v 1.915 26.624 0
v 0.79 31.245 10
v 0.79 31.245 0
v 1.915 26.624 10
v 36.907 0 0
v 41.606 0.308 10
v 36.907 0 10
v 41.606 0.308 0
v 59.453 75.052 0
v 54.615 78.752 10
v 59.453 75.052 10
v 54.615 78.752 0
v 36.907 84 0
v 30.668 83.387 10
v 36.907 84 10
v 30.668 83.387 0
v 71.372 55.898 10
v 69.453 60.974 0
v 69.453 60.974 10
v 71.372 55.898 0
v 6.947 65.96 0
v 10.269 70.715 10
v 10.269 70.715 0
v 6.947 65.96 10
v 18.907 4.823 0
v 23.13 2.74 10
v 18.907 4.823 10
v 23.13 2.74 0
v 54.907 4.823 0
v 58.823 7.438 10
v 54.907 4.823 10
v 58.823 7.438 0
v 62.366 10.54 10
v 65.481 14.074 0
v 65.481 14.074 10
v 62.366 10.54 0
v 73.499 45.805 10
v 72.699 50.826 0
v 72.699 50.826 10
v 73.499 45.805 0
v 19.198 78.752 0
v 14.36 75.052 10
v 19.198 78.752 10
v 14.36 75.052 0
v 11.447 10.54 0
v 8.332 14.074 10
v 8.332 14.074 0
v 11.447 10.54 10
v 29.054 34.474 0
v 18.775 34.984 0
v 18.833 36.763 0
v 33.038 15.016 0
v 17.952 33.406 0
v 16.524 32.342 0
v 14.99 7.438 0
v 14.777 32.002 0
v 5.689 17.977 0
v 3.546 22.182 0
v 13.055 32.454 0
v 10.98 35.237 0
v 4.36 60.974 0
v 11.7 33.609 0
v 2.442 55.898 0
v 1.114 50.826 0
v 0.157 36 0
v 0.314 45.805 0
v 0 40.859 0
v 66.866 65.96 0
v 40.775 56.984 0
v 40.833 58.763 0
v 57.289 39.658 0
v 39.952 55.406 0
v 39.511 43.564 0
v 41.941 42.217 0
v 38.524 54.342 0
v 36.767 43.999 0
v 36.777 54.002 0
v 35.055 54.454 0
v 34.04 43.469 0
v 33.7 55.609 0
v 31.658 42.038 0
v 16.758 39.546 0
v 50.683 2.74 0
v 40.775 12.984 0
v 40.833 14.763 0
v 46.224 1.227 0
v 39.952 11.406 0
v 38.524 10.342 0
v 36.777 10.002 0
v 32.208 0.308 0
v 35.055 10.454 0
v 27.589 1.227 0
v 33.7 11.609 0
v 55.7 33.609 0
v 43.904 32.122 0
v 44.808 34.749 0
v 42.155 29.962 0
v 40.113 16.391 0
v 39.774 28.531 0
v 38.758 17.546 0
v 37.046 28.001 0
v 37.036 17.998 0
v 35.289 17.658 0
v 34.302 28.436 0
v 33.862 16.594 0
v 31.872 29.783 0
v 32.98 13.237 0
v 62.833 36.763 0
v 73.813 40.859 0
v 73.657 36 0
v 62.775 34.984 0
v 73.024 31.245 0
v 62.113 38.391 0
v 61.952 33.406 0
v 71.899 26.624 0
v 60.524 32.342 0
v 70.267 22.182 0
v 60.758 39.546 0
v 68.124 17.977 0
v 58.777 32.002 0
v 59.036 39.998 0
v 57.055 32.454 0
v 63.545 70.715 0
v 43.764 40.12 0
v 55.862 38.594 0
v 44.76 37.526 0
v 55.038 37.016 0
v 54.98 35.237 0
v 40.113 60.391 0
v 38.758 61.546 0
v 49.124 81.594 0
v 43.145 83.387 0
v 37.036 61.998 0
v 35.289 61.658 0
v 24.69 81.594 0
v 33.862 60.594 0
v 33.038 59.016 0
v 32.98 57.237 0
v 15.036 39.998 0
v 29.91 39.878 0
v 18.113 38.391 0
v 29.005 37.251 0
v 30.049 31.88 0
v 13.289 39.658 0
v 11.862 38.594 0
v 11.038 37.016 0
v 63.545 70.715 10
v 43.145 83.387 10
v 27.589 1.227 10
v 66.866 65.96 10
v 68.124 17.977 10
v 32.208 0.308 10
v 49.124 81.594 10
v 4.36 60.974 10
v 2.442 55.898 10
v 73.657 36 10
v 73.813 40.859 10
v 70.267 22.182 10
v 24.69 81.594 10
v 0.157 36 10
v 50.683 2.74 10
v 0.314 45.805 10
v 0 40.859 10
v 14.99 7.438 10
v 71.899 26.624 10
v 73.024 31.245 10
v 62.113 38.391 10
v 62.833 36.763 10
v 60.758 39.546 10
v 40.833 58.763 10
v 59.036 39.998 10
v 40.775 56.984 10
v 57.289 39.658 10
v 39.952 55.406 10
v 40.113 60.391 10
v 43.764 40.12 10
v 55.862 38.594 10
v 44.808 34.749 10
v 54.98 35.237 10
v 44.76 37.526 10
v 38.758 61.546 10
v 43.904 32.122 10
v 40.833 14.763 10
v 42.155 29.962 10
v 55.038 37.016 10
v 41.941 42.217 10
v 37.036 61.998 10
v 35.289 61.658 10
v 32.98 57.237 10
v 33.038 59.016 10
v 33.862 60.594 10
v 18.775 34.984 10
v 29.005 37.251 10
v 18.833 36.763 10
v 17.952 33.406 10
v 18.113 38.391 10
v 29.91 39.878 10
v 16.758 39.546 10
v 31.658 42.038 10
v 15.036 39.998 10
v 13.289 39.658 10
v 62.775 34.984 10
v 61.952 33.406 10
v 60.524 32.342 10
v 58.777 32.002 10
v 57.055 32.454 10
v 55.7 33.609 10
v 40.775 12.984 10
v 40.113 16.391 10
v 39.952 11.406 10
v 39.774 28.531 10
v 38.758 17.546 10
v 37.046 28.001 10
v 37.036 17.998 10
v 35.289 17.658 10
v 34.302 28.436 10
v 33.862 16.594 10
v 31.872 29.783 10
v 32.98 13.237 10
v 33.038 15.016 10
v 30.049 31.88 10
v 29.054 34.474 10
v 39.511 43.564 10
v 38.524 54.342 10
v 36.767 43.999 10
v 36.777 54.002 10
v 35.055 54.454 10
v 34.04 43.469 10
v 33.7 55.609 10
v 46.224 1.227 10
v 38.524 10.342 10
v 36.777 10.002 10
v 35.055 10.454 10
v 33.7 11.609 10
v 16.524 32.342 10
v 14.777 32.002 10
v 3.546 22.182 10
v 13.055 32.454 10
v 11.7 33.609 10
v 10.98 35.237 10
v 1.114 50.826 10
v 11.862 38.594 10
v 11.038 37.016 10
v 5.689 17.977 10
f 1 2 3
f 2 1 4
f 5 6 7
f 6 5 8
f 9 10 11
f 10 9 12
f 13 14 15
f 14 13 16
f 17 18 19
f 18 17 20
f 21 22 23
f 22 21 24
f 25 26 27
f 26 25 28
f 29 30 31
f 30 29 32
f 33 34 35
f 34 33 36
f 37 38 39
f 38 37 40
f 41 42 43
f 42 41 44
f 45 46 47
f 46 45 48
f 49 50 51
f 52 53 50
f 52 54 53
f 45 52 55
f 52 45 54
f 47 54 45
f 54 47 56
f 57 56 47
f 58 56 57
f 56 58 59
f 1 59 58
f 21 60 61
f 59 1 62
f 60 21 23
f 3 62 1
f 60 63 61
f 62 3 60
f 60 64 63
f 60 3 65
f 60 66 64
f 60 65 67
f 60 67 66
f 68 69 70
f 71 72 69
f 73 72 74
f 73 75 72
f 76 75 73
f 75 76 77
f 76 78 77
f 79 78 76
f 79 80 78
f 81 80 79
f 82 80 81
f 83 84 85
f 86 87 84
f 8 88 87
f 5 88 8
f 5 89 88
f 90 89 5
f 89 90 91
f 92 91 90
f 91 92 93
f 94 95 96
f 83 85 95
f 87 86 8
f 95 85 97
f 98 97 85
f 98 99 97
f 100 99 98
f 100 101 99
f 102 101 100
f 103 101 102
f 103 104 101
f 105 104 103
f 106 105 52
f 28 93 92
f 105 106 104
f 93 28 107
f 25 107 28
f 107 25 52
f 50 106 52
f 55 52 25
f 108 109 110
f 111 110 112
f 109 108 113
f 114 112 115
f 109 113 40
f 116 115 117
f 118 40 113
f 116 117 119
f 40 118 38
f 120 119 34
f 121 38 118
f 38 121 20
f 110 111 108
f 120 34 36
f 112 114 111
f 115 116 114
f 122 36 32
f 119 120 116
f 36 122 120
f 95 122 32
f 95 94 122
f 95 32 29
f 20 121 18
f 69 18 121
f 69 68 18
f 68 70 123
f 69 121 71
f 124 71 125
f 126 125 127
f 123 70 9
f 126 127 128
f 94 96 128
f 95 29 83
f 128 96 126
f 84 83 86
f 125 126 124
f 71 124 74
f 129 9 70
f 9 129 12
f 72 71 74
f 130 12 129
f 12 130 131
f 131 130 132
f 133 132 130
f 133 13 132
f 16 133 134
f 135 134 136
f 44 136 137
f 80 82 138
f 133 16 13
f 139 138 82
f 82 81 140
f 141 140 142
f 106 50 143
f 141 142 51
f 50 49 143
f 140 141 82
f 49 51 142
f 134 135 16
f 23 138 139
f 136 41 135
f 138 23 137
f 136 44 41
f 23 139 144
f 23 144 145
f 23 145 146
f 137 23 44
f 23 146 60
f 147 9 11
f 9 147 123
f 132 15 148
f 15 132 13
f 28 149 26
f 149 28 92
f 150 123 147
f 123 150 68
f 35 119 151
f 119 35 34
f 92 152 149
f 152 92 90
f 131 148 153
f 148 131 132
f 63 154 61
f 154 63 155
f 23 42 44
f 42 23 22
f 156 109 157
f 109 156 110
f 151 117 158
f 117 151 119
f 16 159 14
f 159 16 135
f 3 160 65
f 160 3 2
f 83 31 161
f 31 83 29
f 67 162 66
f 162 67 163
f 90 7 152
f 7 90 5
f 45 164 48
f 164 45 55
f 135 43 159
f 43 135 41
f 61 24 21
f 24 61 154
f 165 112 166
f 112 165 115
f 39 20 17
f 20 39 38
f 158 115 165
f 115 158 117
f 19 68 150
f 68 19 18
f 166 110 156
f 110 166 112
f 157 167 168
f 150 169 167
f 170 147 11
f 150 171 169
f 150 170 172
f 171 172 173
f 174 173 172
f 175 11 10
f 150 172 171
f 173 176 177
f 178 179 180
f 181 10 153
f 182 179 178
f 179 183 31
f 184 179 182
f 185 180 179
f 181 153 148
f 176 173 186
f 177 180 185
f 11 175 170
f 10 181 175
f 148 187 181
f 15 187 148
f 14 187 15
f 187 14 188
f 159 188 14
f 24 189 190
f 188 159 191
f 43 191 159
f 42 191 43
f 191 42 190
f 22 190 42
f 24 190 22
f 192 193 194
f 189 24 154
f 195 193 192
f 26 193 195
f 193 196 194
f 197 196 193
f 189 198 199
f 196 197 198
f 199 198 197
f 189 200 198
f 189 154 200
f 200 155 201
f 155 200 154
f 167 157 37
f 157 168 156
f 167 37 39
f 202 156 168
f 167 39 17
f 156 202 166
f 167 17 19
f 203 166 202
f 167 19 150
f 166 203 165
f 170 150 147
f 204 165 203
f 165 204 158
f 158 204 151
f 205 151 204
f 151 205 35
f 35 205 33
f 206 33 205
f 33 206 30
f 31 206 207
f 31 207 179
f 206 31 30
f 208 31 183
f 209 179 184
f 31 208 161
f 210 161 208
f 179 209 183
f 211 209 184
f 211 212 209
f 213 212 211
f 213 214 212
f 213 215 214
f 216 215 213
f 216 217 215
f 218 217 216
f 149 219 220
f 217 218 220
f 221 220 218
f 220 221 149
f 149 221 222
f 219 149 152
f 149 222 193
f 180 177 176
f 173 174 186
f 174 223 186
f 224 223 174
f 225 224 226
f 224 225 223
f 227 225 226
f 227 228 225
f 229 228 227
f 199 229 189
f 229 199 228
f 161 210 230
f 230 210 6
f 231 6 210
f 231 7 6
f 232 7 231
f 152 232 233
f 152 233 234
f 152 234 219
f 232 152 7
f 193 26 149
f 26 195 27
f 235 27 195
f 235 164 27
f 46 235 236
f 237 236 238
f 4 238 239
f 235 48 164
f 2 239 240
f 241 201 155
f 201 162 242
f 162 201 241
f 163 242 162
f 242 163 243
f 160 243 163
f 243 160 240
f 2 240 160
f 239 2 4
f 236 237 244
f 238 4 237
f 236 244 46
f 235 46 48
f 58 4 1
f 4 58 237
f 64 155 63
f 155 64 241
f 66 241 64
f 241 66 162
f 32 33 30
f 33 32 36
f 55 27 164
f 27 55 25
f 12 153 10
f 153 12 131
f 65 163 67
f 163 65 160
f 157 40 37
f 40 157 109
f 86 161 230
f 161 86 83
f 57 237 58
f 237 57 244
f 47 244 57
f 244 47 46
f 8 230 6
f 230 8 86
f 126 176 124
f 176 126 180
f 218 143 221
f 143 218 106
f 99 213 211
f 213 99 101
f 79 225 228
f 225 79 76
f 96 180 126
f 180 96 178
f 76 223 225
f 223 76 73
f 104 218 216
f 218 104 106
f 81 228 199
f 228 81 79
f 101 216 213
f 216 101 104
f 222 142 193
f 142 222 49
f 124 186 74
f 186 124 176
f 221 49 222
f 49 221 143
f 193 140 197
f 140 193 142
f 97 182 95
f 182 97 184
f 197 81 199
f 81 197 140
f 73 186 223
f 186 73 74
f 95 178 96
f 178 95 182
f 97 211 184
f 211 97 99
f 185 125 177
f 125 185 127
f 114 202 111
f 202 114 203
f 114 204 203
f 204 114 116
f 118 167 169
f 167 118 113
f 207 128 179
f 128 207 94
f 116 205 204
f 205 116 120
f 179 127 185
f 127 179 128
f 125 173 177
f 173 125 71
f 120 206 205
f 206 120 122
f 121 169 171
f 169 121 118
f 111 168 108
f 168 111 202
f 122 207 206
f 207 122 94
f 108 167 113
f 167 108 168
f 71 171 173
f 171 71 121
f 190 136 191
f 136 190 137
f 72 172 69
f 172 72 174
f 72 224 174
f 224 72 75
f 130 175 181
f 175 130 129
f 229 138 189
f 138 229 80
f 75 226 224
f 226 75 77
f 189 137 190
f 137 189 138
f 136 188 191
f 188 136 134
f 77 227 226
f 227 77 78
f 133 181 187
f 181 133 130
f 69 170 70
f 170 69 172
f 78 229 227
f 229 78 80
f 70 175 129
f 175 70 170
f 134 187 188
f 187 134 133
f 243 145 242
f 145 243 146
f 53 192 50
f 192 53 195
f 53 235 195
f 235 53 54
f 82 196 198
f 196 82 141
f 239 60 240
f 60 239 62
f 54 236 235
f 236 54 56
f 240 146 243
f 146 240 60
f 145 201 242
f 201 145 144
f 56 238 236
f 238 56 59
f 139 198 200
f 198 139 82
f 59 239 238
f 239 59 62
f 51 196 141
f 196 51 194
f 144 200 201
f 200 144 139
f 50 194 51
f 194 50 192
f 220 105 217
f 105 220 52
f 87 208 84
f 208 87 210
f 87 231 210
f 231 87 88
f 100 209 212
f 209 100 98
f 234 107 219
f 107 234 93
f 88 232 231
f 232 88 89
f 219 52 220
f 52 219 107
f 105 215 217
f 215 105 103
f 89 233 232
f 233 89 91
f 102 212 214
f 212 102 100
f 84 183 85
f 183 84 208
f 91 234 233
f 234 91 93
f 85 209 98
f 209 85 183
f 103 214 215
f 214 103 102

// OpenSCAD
$fn = 32;

// ----------------------------------------------------------------------
// Cam plate: single_lobe cam, base R36
// ----------------------------------------------------------------------

// --- parameters (mm) ---
base_r = 36;              // base circle radius
lobe_h = 12;              // cam lobe rise
bore_r = 8;               // shaft bore radius
plate_t = 10;             // plate thickness, Z (extrusion height)
ring_r = 22;              // lightening ring radius
bolt_r = 4;               // lightening hole radius
fit_tol = 0.05;           // declared fit tolerance (prompt contract)
free_tol = 0.2;           // declared free tolerance (prompt contract)

profile = [[73.657, 36], [73.813, 40.859], [73.499, 45.805], [72.699, 50.826], [71.372, 55.898], [69.453, 60.974], [66.866, 65.96], [63.545, 70.715], [59.453, 75.052], [54.615, 78.752], [49.124, 81.594], [43.145, 83.387], [36.907, 84], [30.668, 83.387], [24.69, 81.594], [19.198, 78.752], [14.36, 75.052], [10.269, 70.715], [6.947, 65.96], [4.36, 60.974], [2.442, 55.898], [1.114, 50.826], [0.314, 45.805], [0, 40.859], [0.157, 36], [0.79, 31.245], [1.915, 26.624], [3.546, 22.182], [5.689, 17.977], [8.332, 14.074], [11.447, 10.54], [14.99, 7.438], [18.907, 4.823], [23.13, 2.74], [27.589, 1.227], [32.208, 0.308], [36.907, 0], [41.606, 0.308], [46.224, 1.227], [50.683, 2.74], [54.907, 4.823], [58.823, 7.438], [62.366, 10.54], [65.481, 14.074], [68.124, 17.977], [70.267, 22.182], [71.899, 26.624], [73.024, 31.245]];  // primary outline, 48 points, counter clockwise
void_1 = [[44.76, 37.526], [43.764, 40.12], [41.941, 42.217], [39.511, 43.564], [36.767, 43.999], [34.04, 43.469], [31.658, 42.038], [29.91, 39.878], [29.005, 37.251], [29.054, 34.474], [30.049, 31.88], [31.872, 29.783], [34.302, 28.436], [37.046, 28.001], [39.774, 28.531], [42.155, 29.962], [43.904, 32.122], [44.808, 34.749]];  // shaft bore, 18 points
void_2 = [[62.833, 36.763], [62.113, 38.391], [60.758, 39.546], [59.036, 39.998], [57.289, 39.658], [55.862, 38.594], [55.038, 37.016], [54.98, 35.237], [55.7, 33.609], [57.055, 32.454], [58.777, 32.002], [60.524, 32.342], [61.952, 33.406], [62.775, 34.984]];  // lightening hole 1, 14 points
void_3 = [[40.833, 58.763], [40.113, 60.391], [38.758, 61.546], [37.036, 61.998], [35.289, 61.658], [33.862, 60.594], [33.038, 59.016], [32.98, 57.237], [33.7, 55.609], [35.055, 54.454], [36.777, 54.002], [38.524, 54.342], [39.952, 55.406], [40.775, 56.984]];  // lightening hole 2, 14 points
void_4 = [[18.833, 36.763], [18.113, 38.391], [16.758, 39.546], [15.036, 39.998], [13.289, 39.658], [11.862, 38.594], [11.038, 37.016], [10.98, 35.237], [11.7, 33.609], [13.055, 32.454], [14.777, 32.002], [16.524, 32.342], [17.952, 33.406], [18.775, 34.984]];  // lightening hole 3, 14 points
void_5 = [[40.833, 14.763], [40.113, 16.391], [38.758, 17.546], [37.036, 17.998], [35.289, 17.658], [33.862, 16.594], [33.038, 15.016], [32.98, 13.237], [33.7, 11.609], [35.055, 10.454], [36.777, 10.002], [38.524, 10.342], [39.952, 11.406], [40.775, 12.984]];  // lightening hole 4, 14 points

// --- the one profile operation ---
difference() {
  linear_extrude(height = plate_t) polygon(points = profile);
  translate([0, 0, -1])
    linear_extrude(height = plate_t + 2) polygon(points = void_1);
  translate([0, 0, -1])
    linear_extrude(height = plate_t + 2) polygon(points = void_2);
  translate([0, 0, -1])
    linear_extrude(height = plate_t + 2) polygon(points = void_3);
  translate([0, 0, -1])
    linear_extrude(height = plate_t + 2) polygon(points = void_4);
  translate([0, 0, -1])
    linear_extrude(height = plate_t + 2) polygon(points = void_5);
}
